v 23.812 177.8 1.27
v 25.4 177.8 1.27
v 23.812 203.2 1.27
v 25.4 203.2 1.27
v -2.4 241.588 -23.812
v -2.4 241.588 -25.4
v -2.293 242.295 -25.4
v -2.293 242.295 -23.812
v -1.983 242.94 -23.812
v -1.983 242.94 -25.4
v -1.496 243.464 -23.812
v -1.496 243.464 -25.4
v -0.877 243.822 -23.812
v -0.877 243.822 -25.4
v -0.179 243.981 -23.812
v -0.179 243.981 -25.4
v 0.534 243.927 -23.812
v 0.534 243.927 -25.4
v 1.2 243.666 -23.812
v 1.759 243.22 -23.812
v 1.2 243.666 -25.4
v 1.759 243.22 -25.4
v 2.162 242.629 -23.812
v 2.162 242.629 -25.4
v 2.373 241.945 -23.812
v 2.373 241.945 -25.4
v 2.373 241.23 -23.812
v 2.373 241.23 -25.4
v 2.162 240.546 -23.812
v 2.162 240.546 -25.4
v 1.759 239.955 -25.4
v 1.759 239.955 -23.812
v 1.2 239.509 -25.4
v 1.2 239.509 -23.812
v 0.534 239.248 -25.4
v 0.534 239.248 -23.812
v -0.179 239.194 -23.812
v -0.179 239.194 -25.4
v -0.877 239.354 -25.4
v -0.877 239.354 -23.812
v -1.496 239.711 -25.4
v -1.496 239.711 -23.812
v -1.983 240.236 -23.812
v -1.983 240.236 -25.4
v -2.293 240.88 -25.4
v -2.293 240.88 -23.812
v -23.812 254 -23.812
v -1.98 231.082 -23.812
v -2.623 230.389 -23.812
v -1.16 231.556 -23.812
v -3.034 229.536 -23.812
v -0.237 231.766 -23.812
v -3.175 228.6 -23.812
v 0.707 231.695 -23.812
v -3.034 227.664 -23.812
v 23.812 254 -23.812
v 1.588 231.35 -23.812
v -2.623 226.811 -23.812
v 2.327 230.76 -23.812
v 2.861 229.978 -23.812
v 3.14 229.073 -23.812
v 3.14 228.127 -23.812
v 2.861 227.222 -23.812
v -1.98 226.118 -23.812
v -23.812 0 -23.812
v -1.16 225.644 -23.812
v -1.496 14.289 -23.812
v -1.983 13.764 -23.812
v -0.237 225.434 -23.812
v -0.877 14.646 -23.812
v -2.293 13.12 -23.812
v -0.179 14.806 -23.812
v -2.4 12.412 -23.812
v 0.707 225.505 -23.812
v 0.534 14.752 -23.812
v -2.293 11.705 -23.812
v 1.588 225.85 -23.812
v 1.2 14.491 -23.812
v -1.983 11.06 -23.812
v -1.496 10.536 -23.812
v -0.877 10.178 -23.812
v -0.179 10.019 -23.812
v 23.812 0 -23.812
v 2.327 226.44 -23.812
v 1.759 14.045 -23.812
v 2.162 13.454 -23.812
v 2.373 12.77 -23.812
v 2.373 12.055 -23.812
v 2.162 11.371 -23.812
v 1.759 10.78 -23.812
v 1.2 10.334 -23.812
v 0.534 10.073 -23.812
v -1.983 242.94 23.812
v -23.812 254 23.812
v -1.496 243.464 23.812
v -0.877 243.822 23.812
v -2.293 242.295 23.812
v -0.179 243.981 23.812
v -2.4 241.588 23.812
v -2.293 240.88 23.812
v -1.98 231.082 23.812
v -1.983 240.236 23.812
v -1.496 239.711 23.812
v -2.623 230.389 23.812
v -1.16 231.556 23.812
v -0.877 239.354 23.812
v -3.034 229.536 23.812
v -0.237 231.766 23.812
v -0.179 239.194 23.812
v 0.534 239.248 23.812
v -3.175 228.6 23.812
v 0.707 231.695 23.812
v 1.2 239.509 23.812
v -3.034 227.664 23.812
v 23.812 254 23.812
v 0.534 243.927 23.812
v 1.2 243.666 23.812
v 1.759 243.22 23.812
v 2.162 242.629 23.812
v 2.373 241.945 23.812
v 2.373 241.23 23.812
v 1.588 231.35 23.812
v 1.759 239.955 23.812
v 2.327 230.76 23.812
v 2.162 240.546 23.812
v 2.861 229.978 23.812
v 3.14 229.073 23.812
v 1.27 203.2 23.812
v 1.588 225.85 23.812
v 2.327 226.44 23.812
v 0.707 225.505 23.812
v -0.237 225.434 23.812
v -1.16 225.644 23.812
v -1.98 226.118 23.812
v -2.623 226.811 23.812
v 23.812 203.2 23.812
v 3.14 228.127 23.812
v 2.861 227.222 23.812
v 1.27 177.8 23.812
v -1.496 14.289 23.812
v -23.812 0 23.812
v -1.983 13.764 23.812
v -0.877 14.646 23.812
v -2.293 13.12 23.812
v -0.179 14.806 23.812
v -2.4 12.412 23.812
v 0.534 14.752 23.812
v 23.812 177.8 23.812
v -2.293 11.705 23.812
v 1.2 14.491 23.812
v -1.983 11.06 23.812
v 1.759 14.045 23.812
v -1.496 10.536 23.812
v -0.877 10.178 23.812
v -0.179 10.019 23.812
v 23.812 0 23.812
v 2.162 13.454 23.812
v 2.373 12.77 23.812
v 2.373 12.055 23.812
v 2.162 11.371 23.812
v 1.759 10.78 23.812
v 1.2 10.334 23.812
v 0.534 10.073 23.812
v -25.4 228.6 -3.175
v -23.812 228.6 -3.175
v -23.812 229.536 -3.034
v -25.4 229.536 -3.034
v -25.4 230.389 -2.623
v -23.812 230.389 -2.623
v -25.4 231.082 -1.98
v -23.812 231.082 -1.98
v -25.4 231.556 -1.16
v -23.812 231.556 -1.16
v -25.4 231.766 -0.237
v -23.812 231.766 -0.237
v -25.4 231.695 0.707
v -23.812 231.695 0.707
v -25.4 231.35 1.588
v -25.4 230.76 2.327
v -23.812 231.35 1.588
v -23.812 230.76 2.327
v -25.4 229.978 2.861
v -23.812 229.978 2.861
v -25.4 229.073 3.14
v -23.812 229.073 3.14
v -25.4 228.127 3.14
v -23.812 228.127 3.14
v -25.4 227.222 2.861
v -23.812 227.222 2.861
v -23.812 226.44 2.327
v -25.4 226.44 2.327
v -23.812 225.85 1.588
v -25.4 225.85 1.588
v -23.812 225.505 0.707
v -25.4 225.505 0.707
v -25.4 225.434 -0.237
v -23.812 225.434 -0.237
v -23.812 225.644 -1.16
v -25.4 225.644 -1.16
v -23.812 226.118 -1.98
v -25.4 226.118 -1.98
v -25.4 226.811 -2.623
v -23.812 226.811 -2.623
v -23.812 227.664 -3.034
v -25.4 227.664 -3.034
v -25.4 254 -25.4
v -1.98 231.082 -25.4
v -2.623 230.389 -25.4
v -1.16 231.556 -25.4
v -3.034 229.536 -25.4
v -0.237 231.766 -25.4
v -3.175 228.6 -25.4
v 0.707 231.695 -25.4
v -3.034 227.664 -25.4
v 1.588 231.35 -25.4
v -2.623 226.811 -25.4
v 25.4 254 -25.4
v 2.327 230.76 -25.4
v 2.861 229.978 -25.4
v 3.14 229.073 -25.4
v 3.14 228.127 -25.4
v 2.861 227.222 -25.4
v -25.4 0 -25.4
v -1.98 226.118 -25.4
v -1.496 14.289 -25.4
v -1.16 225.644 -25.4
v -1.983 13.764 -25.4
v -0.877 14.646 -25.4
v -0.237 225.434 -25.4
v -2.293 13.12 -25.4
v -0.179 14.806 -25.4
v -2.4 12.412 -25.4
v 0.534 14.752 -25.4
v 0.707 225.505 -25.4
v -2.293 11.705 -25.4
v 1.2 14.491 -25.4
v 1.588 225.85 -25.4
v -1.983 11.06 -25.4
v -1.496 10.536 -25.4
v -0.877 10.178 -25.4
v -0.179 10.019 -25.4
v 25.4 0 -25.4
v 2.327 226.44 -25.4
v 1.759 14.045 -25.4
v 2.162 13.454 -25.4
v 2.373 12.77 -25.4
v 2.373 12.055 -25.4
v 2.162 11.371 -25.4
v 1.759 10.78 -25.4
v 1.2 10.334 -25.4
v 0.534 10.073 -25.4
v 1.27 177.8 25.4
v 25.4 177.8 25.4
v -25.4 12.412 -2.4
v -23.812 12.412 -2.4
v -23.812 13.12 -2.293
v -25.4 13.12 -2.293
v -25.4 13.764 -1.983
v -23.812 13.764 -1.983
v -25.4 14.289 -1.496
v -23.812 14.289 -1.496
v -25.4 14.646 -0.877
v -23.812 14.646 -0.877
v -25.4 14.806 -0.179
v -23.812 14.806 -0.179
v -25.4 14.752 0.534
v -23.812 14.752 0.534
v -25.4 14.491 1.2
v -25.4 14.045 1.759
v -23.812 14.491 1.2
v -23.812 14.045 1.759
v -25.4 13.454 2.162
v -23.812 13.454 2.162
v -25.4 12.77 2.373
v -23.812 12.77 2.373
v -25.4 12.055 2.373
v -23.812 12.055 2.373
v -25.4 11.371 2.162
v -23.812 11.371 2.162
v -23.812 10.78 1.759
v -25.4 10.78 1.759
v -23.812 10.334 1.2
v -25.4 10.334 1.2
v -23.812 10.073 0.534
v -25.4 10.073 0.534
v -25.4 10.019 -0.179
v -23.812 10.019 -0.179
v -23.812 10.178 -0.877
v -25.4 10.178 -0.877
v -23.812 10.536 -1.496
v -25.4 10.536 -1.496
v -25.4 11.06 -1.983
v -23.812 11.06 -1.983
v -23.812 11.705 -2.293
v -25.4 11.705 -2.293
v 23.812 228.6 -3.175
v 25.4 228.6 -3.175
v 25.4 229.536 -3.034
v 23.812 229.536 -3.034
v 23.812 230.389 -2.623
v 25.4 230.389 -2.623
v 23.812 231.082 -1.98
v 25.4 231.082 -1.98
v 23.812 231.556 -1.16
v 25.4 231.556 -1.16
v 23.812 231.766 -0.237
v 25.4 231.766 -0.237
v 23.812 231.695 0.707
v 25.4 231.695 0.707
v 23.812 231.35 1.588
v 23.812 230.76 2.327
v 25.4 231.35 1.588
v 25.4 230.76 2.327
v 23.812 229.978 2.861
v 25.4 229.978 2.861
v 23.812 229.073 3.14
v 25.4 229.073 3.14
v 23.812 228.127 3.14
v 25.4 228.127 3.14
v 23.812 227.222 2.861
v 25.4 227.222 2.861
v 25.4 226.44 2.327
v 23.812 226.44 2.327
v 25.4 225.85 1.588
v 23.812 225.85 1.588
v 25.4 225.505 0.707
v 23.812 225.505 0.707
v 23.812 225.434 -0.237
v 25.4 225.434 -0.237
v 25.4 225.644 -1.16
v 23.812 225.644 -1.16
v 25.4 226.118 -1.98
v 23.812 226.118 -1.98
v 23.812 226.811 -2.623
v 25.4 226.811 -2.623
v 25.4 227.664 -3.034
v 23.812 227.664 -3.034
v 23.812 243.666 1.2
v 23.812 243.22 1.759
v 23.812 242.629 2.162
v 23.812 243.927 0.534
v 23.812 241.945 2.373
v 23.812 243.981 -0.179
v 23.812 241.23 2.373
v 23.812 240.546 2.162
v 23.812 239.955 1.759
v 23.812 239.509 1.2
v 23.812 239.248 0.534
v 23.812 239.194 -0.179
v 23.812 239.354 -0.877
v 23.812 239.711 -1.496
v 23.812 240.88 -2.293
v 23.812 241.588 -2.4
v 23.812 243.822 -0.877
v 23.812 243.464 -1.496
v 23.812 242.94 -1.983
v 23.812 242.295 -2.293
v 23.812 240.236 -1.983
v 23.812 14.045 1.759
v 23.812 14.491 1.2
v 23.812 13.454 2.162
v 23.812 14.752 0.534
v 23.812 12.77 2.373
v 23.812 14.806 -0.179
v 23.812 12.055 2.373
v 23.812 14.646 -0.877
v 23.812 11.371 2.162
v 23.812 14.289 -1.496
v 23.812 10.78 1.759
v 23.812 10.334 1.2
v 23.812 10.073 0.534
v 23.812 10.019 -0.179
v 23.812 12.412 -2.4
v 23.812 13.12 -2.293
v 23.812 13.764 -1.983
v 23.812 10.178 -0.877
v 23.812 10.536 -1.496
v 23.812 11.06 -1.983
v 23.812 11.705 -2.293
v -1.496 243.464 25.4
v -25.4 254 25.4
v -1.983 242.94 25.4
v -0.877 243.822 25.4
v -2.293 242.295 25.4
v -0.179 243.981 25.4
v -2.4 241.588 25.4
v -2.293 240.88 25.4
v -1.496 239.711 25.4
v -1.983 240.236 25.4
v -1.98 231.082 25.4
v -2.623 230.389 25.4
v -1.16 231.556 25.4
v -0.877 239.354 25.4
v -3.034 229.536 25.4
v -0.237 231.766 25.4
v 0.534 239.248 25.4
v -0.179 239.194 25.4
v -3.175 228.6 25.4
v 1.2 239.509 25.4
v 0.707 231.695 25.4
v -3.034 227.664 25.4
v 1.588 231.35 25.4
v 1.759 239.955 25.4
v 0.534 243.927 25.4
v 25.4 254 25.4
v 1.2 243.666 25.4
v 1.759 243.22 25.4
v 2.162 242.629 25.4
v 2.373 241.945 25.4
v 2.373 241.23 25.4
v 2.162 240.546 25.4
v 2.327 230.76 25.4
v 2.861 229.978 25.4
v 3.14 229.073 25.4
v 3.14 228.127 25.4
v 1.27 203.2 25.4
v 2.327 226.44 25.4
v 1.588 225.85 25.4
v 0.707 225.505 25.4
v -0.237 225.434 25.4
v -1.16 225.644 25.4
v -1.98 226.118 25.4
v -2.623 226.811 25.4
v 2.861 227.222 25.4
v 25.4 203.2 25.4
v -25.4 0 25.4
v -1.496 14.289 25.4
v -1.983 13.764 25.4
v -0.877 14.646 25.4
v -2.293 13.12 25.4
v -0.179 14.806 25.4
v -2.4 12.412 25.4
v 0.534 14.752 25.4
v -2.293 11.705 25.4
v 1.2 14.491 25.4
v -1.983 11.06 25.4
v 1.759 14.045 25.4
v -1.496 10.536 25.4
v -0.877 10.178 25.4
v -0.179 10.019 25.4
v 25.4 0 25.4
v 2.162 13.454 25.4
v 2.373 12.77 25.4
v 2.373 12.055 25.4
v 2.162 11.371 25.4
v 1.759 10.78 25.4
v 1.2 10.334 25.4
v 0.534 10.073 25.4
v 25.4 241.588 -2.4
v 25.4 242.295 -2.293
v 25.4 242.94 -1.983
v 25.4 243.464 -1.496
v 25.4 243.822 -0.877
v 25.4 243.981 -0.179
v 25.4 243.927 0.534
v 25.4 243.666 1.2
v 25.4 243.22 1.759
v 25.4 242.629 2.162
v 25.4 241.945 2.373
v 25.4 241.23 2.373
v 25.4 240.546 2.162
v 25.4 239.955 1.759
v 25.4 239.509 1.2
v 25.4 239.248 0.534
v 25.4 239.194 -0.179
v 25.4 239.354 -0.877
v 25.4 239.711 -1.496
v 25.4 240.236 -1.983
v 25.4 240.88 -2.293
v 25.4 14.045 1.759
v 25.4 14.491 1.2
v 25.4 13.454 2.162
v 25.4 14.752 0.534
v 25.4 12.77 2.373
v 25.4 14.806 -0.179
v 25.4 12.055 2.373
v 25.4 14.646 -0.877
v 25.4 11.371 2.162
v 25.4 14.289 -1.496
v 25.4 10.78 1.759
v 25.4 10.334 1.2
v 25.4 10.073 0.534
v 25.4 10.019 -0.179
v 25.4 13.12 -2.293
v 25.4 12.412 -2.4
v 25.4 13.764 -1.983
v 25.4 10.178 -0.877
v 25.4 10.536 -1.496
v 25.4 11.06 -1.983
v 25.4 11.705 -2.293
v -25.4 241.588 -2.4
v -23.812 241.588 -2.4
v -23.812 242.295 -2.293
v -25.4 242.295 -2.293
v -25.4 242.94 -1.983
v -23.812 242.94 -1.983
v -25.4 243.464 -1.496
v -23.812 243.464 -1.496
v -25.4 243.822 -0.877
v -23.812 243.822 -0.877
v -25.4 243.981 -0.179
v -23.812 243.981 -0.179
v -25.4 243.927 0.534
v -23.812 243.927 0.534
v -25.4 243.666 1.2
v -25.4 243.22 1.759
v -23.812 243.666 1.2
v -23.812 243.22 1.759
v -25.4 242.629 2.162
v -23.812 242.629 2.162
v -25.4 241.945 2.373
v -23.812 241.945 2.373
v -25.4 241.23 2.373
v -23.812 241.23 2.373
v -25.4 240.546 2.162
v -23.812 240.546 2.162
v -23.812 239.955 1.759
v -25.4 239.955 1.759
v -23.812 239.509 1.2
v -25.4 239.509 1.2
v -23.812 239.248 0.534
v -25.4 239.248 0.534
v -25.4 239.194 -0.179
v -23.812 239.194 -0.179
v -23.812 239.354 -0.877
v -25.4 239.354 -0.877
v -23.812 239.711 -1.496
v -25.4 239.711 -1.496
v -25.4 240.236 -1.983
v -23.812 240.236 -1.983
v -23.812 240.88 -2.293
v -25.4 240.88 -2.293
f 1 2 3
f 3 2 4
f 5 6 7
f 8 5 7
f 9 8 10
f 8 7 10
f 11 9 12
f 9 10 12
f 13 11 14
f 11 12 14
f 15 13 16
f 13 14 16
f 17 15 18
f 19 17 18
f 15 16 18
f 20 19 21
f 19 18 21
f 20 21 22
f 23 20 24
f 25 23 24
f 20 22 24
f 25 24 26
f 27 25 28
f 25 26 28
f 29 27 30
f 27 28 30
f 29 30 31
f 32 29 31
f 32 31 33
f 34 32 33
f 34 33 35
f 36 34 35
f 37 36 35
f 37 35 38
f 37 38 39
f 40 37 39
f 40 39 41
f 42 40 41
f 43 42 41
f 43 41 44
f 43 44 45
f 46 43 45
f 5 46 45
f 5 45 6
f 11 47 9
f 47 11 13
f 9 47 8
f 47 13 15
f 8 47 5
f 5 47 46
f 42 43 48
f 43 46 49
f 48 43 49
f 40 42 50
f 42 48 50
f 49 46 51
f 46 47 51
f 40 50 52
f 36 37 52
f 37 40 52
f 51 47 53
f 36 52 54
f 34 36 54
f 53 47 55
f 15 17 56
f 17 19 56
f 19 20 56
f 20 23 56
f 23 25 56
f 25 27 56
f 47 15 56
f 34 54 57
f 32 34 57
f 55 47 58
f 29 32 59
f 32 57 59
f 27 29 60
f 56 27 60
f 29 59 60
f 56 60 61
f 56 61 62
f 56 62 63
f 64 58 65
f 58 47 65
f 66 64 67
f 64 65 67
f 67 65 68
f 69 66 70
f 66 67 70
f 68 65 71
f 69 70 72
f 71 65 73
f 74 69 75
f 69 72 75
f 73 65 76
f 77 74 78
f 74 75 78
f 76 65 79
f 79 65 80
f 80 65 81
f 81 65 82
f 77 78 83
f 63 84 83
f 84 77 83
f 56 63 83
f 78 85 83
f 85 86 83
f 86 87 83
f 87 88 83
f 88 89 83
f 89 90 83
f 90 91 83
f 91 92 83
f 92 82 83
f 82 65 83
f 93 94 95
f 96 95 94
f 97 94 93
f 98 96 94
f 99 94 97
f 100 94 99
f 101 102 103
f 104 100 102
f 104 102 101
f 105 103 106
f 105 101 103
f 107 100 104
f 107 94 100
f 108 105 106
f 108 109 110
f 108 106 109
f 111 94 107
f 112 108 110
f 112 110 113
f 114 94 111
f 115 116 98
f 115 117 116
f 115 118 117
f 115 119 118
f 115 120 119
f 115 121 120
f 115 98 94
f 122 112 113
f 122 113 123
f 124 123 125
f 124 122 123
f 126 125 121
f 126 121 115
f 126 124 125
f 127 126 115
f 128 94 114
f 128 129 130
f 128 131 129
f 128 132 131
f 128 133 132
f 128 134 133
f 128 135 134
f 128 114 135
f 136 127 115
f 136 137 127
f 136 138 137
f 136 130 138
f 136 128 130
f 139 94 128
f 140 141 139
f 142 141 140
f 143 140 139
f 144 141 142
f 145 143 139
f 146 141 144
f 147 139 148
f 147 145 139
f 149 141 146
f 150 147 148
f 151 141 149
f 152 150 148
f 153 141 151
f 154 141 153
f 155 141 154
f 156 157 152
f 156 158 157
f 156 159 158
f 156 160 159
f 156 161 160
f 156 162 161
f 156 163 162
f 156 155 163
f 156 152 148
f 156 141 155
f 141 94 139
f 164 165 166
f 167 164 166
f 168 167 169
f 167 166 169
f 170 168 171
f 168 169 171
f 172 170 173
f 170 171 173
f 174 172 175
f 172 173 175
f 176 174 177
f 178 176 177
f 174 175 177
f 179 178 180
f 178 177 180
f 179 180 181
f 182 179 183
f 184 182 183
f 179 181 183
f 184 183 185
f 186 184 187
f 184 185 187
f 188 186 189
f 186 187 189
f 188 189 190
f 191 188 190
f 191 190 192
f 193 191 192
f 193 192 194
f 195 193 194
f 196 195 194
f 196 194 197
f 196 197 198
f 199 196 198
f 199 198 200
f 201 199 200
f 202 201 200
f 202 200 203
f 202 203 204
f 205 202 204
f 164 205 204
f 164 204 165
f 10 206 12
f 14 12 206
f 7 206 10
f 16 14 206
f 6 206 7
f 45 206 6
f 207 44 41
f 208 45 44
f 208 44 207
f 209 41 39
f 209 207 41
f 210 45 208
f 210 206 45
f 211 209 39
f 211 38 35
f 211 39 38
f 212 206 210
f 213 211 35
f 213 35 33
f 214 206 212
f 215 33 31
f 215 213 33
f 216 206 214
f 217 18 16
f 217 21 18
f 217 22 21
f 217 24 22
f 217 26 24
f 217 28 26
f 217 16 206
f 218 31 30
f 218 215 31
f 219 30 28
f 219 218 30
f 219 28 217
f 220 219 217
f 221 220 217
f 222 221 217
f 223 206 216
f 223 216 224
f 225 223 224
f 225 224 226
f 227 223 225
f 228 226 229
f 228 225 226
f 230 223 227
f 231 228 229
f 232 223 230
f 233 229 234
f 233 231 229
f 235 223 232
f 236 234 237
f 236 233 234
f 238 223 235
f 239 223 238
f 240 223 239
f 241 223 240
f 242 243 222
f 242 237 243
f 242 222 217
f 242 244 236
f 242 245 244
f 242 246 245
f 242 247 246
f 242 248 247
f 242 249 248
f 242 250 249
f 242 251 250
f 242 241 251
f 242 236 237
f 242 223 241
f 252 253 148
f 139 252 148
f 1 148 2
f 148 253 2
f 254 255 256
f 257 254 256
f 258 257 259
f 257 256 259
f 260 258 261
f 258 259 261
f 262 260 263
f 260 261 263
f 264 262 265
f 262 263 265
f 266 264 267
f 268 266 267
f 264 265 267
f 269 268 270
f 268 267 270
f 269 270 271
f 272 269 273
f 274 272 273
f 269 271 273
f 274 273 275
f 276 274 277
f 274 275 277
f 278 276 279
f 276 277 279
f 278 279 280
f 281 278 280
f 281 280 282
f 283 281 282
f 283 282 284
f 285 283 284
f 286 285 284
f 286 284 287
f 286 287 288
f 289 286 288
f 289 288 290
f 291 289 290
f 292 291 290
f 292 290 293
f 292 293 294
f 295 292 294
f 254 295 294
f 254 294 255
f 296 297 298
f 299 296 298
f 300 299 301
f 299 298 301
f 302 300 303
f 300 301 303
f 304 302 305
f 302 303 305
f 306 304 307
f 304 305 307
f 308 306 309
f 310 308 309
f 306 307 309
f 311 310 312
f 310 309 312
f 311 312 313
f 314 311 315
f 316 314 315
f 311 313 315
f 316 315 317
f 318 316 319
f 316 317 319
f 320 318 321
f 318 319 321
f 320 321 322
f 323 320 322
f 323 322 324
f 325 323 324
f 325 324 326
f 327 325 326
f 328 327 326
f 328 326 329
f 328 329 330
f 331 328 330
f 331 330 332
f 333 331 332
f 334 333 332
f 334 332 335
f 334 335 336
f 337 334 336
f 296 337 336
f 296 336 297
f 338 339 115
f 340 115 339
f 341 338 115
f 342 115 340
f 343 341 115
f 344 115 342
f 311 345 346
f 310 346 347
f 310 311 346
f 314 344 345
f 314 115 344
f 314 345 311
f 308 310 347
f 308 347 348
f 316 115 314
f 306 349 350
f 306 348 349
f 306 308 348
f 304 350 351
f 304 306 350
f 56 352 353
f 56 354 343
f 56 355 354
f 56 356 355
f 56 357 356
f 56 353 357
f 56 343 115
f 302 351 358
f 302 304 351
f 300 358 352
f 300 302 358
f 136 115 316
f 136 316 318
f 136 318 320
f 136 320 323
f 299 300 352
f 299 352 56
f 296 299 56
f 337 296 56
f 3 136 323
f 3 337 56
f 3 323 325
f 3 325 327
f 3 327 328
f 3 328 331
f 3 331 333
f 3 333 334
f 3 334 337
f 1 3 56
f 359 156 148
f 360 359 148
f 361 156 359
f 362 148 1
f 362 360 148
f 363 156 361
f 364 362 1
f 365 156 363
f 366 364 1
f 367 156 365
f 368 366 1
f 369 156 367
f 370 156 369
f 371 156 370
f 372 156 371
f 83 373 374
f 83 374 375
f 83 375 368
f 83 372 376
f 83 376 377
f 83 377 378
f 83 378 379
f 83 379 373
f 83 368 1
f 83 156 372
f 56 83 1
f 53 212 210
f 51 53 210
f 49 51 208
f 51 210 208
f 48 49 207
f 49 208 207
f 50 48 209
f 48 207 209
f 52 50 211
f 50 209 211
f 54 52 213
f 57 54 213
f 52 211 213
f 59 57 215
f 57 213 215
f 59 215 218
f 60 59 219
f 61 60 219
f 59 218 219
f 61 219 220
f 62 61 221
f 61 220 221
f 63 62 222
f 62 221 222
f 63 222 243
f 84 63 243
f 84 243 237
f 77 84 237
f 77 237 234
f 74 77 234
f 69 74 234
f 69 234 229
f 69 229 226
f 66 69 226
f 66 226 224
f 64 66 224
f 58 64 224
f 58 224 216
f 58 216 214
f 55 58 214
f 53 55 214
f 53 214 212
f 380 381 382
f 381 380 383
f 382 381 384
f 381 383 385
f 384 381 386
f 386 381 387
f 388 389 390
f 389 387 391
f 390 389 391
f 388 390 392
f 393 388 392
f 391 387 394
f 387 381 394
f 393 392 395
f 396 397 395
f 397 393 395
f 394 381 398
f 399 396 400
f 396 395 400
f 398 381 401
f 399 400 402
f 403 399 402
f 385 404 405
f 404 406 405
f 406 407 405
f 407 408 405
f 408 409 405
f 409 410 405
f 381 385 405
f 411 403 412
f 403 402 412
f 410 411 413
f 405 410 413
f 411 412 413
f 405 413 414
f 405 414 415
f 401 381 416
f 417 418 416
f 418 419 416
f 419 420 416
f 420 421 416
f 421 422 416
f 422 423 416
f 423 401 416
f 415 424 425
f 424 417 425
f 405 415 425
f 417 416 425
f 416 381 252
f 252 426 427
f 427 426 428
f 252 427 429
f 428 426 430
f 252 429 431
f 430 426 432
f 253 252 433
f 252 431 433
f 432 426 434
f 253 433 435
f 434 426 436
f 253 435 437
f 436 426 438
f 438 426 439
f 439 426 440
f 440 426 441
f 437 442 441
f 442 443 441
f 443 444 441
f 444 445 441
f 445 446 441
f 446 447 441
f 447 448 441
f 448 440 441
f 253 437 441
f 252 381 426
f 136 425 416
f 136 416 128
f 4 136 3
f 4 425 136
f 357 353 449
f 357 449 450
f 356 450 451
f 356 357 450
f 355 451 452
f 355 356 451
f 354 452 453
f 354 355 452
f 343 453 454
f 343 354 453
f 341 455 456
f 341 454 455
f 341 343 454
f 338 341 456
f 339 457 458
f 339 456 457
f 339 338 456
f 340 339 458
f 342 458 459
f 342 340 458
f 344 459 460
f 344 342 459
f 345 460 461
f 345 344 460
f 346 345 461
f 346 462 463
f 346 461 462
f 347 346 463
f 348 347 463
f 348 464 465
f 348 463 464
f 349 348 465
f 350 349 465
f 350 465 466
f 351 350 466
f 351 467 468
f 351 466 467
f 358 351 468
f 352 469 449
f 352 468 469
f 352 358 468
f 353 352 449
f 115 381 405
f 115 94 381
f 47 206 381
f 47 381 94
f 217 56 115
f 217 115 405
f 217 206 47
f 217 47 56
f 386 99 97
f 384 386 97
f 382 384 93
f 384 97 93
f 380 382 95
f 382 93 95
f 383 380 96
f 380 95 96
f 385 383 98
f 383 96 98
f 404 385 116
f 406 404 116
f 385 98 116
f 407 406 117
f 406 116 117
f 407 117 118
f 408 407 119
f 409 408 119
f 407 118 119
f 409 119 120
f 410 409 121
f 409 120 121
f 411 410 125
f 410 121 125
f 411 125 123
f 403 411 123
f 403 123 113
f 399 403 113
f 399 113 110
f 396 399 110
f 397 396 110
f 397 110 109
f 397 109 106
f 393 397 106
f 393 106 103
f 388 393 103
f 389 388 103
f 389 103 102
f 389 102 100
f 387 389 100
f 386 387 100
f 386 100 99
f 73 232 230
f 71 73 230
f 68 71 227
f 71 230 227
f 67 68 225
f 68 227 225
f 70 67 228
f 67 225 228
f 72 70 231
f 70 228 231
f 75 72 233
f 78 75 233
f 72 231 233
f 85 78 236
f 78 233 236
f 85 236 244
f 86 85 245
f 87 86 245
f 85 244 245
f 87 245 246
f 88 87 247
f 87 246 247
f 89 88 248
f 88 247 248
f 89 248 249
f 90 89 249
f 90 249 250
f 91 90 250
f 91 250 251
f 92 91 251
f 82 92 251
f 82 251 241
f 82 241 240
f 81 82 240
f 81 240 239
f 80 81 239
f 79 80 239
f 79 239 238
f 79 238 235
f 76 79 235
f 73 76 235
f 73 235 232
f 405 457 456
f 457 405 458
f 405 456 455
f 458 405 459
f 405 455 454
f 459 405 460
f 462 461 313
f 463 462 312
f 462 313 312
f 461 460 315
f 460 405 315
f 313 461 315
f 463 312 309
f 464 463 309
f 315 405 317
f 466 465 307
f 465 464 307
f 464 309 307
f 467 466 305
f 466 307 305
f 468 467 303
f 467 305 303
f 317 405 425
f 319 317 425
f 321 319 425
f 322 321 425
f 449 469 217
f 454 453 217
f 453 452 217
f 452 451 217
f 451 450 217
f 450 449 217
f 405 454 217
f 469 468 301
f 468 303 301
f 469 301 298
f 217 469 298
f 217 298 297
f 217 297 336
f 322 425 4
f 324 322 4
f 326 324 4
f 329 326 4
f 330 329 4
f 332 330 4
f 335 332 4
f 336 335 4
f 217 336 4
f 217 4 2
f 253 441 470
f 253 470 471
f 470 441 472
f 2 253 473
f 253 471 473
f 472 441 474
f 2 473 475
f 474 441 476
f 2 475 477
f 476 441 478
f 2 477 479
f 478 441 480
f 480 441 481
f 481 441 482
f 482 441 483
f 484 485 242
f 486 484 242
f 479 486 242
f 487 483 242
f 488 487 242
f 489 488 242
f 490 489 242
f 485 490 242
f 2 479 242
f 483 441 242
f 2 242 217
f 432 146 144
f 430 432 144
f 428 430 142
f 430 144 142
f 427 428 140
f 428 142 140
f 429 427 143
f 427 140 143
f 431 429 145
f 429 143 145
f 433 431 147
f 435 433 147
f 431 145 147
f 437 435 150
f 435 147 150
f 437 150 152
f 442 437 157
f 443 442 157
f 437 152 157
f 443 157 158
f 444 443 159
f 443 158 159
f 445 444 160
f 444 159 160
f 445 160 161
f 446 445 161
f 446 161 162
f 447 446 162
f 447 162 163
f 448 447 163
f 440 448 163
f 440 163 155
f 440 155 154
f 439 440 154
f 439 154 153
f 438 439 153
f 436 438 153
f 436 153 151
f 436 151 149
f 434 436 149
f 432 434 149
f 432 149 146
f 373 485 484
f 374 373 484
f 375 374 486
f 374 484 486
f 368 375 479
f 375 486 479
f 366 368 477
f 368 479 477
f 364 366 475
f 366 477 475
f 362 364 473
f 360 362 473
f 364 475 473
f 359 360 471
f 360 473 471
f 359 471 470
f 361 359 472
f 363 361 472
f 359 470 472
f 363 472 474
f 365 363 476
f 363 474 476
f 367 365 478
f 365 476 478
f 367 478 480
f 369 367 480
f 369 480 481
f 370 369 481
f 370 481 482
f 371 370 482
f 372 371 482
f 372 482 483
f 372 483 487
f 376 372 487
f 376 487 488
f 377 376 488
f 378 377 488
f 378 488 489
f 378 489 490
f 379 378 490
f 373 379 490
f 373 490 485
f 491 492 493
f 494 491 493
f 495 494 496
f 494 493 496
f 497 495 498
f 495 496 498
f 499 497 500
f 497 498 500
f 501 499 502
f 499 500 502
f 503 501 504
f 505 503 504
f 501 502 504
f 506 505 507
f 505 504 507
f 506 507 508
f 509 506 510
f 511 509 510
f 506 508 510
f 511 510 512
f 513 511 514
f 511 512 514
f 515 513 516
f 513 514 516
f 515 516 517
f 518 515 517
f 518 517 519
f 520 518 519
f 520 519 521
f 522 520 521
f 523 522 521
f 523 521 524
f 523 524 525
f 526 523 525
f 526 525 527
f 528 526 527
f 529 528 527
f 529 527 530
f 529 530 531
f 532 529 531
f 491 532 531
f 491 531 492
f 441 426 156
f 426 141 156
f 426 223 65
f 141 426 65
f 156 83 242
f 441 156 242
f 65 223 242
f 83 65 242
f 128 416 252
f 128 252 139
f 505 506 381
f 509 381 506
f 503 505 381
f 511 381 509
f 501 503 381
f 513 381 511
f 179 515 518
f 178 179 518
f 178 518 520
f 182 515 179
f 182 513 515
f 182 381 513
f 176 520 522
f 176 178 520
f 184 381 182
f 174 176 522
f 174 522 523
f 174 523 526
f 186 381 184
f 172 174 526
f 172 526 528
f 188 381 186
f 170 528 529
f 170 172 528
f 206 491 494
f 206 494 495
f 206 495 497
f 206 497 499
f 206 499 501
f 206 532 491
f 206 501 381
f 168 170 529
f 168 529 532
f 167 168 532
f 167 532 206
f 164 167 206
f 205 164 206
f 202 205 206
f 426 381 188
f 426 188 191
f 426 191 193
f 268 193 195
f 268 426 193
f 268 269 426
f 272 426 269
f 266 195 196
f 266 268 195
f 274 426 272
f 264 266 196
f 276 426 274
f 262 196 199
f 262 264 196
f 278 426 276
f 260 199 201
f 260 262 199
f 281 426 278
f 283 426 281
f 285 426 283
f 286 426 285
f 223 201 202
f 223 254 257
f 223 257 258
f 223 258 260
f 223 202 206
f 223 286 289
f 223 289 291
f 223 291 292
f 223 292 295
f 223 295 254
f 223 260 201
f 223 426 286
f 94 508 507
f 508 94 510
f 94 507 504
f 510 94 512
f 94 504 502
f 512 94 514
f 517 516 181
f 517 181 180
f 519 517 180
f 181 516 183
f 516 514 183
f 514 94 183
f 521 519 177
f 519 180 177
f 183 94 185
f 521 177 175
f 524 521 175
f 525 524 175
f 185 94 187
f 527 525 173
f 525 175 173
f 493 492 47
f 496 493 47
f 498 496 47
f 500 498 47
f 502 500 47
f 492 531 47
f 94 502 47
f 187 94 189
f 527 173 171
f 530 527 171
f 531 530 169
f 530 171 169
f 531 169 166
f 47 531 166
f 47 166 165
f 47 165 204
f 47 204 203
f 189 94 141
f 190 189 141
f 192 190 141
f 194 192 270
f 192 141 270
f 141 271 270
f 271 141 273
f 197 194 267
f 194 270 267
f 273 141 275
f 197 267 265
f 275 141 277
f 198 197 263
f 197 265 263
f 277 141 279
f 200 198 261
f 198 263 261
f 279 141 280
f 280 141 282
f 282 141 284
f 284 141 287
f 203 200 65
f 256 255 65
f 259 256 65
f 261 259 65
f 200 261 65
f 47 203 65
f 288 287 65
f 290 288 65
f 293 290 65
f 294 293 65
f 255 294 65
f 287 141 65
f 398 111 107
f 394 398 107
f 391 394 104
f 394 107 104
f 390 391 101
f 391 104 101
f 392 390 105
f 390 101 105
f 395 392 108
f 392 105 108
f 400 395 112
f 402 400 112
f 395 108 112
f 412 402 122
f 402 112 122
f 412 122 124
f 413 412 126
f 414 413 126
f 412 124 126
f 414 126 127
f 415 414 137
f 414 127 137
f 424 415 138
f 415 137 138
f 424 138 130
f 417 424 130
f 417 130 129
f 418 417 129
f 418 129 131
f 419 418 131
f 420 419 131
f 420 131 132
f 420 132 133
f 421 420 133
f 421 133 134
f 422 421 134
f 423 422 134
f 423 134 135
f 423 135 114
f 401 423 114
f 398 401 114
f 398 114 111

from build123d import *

# Parameters (mm, degrees)
SKETCH1_W               = 50.8
SKETCH1_H               = 50.8
SKETCH1_W_2             = 47.625
SKETCH1_H_2             = 47.625
BOSS_EXTRUDE1_DEPTH     = 254
SKETCH4_R               = 2.3999952
CUT_EXTRUDE1_DEPTH      = 50.2125
CUT_EXTRUDE1_DEPTH_BACK = 2.5875
SKETCH5_R               = 2.3999952
CUT_EXTRUDE2_DEPTH      = 51.8
SKETCH6_R               = 2.3999952
CUT_EXTRUDE3_DEPTH      = 1
CUT_EXTRUDE3_DEPTH_BACK = 51.8
SKETCH7_R               = 2.3999952
CUT_EXTRUDE4_DEPTH      = 1
CUT_EXTRUDE4_DEPTH_BACK = 51.8
SKETCH8_R               = 3.175
CUT_EXTRUDE5_DEPTH      = 1
CUT_EXTRUDE5_DEPTH_BACK = 51.8
SKETCH9_R               = 3.175
CUT_EXTRUDE6_DEPTH      = 1
CUT_EXTRUDE6_DEPTH_BACK = 51.8
SKETCH10_W              = 24.13
SKETCH10_H              = 25.4
CUT_EXTRUDE7_DEPTH      = 24.13


with BuildPart() as part:
    # Sketch1 → Boss-Extrude1 (new body)
    with BuildSketch(Plane(origin=(0, 0, 0), x_dir=(1, 0, 0), z_dir=(0, 1, 0))):
        Rectangle(SKETCH1_W, SKETCH1_H)
        Rectangle(SKETCH1_W_2, SKETCH1_H_2, mode=Mode.SUBTRACT)
    extrude(amount=BOSS_EXTRUDE1_DEPTH)

    # Sketch4 → Cut-Extrude1 (cut, two sides)
    with BuildSketch(Plane(origin=(-23.8125, 0, 0), x_dir=(0, 0, -1), z_dir=(1, 0, 0))) as cut_extrude1_sk:
        with Locations((0, 241.587599882)):
            Circle(SKETCH4_R)
    extrude(amount=CUT_EXTRUDE1_DEPTH, mode=Mode.SUBTRACT)
    extrude(cut_extrude1_sk.sketch, amount=-CUT_EXTRUDE1_DEPTH_BACK, mode=Mode.SUBTRACT)

    # Sketch5 → Cut-Extrude2 (cut, through all)
    with BuildSketch(Plane(origin=(0, 0, -25.4), x_dir=(-1, 0, 0), z_dir=(0, 0, -1))):
        with Locations((0, 241.587599882)):
            Circle(SKETCH5_R)
    extrude(amount=-CUT_EXTRUDE2_DEPTH, mode=Mode.SUBTRACT)

    # Sketch6 → Cut-Extrude3 (cut, two sides)
    with BuildSketch(Plane(origin=(25.4, 0, 0), x_dir=(0, 0, -1), z_dir=(1, 0, 0))) as cut_extrude3_sk:
        with Locations((0, 12.412400118)):
            Circle(SKETCH6_R)
    extrude(amount=CUT_EXTRUDE3_DEPTH, mode=Mode.SUBTRACT)
    extrude(cut_extrude3_sk.sketch, amount=-CUT_EXTRUDE3_DEPTH_BACK, mode=Mode.SUBTRACT)

    # Sketch7 → Cut-Extrude4 (cut, two sides)
    with BuildSketch(Plane(origin=(0, 0, -25.4), x_dir=(-1, 0, 0), z_dir=(0, 0, -1))) as cut_extrude4_sk:
        with Locations((0, 12.412400118)):
            Circle(SKETCH7_R)
    extrude(amount=CUT_EXTRUDE4_DEPTH, mode=Mode.SUBTRACT)
    extrude(cut_extrude4_sk.sketch, amount=-CUT_EXTRUDE4_DEPTH_BACK, mode=Mode.SUBTRACT)

    # Sketch8 → Cut-Extrude5 (cut, two sides)
    with BuildSketch(Plane(origin=(0, 0, -25.4), x_dir=(-1, 0, 0), z_dir=(0, 0, -1))) as cut_extrude5_sk:
        with Locations((0, 228.6)):
            Circle(SKETCH8_R)
    extrude(amount=CUT_EXTRUDE5_DEPTH, mode=Mode.SUBTRACT)
    extrude(cut_extrude5_sk.sketch, amount=-CUT_EXTRUDE5_DEPTH_BACK, mode=Mode.SUBTRACT)

    # Sketch9 → Cut-Extrude6 (cut, two sides)
    with BuildSketch(Plane(origin=(25.4, 0, 0), x_dir=(0, 0, -1), z_dir=(1, 0, 0))) as cut_extrude6_sk:
        with Locations((0, 228.6)):
            Circle(SKETCH9_R)
    extrude(amount=CUT_EXTRUDE6_DEPTH, mode=Mode.SUBTRACT)
    extrude(cut_extrude6_sk.sketch, amount=-CUT_EXTRUDE6_DEPTH_BACK, mode=Mode.SUBTRACT)

    # Sketch10 → Cut-Extrude7 (cut)
    with BuildSketch(Plane(origin=(25.4, 0, 0), x_dir=(0, 0, -1), z_dir=(1, 0, 0))):
        with Locations((-13.335, 190.5)):
            Rectangle(SKETCH10_W, SKETCH10_H)
    extrude(amount=-CUT_EXTRUDE7_DEPTH, mode=Mode.SUBTRACT)


solid = part.part
